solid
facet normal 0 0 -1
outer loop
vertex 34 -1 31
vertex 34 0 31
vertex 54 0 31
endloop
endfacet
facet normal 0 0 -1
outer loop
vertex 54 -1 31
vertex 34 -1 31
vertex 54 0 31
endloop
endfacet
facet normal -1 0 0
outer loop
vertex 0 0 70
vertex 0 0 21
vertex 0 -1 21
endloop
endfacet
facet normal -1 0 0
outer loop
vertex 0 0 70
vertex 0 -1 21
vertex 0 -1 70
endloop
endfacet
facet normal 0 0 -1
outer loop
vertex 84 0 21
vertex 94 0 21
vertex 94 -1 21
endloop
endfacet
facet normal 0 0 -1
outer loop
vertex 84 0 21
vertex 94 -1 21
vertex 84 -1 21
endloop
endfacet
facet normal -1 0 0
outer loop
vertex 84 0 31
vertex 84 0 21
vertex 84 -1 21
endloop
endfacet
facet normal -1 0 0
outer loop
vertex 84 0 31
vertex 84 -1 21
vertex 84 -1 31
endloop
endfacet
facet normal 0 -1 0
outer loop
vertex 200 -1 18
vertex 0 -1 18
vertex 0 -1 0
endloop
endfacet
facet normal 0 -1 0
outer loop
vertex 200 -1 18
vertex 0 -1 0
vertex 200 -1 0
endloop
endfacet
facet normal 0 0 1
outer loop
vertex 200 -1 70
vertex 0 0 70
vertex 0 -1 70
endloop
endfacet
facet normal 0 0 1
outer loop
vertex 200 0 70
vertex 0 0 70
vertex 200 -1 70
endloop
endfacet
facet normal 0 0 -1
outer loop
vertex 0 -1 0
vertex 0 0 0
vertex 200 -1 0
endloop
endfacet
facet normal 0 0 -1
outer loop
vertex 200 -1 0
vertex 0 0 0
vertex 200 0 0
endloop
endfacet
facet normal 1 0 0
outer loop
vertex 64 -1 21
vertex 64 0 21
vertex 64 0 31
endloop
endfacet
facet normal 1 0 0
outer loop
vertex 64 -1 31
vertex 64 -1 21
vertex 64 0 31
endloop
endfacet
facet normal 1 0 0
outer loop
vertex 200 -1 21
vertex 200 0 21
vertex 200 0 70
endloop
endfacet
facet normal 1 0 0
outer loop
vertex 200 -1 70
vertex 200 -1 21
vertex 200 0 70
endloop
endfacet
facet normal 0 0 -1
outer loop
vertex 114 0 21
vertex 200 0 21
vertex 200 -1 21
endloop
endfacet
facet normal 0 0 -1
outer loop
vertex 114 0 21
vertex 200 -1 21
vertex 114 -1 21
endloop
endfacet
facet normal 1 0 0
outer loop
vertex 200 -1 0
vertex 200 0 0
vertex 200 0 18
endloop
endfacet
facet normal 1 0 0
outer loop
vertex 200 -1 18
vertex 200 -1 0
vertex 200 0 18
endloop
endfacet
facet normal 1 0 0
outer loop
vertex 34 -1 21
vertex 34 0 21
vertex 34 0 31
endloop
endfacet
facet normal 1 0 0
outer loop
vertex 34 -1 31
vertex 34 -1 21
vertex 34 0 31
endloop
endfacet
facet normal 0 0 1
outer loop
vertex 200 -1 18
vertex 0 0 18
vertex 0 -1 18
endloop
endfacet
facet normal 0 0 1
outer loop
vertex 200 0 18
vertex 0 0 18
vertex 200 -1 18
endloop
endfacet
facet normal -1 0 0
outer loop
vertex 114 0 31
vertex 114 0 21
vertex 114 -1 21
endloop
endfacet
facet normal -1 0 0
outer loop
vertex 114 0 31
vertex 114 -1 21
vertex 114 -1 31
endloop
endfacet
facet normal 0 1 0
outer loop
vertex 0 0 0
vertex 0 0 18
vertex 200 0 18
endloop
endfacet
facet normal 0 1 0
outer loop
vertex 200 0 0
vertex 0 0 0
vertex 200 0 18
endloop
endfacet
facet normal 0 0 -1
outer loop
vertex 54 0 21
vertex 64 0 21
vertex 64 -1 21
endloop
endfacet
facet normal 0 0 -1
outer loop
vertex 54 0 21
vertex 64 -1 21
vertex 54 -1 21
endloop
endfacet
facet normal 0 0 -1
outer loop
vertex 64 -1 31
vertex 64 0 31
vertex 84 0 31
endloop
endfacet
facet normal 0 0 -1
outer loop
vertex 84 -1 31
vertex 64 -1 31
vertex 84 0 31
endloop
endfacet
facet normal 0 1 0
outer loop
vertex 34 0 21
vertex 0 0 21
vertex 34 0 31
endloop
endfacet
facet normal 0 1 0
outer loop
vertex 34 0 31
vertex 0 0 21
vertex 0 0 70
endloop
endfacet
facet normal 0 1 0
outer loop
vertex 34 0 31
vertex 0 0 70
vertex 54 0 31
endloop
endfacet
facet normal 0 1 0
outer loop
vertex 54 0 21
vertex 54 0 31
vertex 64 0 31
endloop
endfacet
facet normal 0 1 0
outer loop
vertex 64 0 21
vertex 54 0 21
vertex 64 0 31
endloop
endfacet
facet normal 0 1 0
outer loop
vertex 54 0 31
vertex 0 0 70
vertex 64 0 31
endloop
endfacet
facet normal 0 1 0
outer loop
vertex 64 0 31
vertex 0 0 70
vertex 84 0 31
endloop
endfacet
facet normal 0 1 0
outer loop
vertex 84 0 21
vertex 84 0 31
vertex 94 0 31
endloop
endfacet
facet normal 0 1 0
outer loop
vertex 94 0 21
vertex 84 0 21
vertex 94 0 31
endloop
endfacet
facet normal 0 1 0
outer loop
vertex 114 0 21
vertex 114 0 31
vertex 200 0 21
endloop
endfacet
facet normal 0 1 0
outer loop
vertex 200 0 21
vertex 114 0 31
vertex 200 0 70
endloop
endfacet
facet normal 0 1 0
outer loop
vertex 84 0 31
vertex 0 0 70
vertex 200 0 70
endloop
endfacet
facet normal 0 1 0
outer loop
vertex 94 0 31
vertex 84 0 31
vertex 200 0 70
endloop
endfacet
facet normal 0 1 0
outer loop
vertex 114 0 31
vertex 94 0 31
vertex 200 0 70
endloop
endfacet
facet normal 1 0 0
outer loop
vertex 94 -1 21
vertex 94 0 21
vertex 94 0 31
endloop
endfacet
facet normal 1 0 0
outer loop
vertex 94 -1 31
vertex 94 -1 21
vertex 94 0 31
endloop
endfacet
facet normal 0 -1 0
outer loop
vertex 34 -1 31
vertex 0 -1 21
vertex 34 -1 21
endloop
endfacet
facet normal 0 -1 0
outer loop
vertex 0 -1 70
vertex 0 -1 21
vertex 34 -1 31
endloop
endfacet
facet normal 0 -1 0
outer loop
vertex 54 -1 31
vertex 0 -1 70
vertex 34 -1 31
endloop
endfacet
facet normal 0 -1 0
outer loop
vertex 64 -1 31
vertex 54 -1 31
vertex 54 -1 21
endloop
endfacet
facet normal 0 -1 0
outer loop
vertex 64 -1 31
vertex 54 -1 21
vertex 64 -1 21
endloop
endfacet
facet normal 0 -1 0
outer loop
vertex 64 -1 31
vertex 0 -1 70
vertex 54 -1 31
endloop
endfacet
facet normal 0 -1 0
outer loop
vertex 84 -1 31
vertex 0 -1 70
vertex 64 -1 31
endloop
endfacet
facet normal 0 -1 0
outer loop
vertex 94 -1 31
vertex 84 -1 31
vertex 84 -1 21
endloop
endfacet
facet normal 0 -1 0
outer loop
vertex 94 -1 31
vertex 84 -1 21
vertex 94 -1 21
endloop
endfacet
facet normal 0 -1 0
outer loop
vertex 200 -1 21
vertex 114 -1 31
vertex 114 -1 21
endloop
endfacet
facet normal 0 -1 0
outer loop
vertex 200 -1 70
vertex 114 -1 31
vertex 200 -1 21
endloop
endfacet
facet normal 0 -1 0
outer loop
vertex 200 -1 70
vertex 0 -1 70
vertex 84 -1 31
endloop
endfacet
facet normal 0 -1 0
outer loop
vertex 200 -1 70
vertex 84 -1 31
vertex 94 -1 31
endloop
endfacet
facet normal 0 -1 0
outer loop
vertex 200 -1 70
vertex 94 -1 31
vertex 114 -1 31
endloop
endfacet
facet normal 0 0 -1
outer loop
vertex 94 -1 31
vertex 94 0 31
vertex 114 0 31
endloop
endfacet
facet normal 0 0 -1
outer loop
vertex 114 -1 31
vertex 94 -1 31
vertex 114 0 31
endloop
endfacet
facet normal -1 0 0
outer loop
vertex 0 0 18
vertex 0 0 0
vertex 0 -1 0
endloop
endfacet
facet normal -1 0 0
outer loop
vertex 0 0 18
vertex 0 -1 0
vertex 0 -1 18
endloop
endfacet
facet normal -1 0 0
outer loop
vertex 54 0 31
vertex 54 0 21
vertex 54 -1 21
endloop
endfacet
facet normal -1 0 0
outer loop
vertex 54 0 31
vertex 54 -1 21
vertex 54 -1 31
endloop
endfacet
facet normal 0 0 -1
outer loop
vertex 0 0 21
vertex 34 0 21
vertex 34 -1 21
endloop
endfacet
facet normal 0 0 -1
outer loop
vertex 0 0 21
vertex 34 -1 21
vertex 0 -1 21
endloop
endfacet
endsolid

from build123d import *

# Parameters (mm, degrees)
F0_W     = 20
F0_H     = 10
F1_DEPTH = 1
F2_W     = 200
F2_H     = 70
F3_DEPTH = 1


with BuildPart() as f1:
    # F0 (on Front) → F1 (new body)
    with BuildSketch(Plane.XZ):
        Polygon((0, 21), (0, 18), (200, 18), (200, 21), (114, 21), (94, 21), (84, 21), (64, 21), (54, 21), (34, 21), align=None)
        with Locations((44, 26)):
            Rectangle(F0_W, F0_H)
        with Locations((104, 26)):
            Rectangle(F0_W, F0_H)
        with Locations((74, 26)):
            Rectangle(F0_W, F0_H)
    extrude(amount=F1_DEPTH)


with BuildPart() as f3:
    # F2 (on Front) → F3 (new body)
    with BuildSketch(Plane.XZ):
        with Locations((100, 35)):
            Rectangle(F2_W, F2_H)
    extrude(amount=F3_DEPTH)

    # F4: cut F1
    add(f1.part, mode=Mode.SUBTRACT)


solid = f3.part
